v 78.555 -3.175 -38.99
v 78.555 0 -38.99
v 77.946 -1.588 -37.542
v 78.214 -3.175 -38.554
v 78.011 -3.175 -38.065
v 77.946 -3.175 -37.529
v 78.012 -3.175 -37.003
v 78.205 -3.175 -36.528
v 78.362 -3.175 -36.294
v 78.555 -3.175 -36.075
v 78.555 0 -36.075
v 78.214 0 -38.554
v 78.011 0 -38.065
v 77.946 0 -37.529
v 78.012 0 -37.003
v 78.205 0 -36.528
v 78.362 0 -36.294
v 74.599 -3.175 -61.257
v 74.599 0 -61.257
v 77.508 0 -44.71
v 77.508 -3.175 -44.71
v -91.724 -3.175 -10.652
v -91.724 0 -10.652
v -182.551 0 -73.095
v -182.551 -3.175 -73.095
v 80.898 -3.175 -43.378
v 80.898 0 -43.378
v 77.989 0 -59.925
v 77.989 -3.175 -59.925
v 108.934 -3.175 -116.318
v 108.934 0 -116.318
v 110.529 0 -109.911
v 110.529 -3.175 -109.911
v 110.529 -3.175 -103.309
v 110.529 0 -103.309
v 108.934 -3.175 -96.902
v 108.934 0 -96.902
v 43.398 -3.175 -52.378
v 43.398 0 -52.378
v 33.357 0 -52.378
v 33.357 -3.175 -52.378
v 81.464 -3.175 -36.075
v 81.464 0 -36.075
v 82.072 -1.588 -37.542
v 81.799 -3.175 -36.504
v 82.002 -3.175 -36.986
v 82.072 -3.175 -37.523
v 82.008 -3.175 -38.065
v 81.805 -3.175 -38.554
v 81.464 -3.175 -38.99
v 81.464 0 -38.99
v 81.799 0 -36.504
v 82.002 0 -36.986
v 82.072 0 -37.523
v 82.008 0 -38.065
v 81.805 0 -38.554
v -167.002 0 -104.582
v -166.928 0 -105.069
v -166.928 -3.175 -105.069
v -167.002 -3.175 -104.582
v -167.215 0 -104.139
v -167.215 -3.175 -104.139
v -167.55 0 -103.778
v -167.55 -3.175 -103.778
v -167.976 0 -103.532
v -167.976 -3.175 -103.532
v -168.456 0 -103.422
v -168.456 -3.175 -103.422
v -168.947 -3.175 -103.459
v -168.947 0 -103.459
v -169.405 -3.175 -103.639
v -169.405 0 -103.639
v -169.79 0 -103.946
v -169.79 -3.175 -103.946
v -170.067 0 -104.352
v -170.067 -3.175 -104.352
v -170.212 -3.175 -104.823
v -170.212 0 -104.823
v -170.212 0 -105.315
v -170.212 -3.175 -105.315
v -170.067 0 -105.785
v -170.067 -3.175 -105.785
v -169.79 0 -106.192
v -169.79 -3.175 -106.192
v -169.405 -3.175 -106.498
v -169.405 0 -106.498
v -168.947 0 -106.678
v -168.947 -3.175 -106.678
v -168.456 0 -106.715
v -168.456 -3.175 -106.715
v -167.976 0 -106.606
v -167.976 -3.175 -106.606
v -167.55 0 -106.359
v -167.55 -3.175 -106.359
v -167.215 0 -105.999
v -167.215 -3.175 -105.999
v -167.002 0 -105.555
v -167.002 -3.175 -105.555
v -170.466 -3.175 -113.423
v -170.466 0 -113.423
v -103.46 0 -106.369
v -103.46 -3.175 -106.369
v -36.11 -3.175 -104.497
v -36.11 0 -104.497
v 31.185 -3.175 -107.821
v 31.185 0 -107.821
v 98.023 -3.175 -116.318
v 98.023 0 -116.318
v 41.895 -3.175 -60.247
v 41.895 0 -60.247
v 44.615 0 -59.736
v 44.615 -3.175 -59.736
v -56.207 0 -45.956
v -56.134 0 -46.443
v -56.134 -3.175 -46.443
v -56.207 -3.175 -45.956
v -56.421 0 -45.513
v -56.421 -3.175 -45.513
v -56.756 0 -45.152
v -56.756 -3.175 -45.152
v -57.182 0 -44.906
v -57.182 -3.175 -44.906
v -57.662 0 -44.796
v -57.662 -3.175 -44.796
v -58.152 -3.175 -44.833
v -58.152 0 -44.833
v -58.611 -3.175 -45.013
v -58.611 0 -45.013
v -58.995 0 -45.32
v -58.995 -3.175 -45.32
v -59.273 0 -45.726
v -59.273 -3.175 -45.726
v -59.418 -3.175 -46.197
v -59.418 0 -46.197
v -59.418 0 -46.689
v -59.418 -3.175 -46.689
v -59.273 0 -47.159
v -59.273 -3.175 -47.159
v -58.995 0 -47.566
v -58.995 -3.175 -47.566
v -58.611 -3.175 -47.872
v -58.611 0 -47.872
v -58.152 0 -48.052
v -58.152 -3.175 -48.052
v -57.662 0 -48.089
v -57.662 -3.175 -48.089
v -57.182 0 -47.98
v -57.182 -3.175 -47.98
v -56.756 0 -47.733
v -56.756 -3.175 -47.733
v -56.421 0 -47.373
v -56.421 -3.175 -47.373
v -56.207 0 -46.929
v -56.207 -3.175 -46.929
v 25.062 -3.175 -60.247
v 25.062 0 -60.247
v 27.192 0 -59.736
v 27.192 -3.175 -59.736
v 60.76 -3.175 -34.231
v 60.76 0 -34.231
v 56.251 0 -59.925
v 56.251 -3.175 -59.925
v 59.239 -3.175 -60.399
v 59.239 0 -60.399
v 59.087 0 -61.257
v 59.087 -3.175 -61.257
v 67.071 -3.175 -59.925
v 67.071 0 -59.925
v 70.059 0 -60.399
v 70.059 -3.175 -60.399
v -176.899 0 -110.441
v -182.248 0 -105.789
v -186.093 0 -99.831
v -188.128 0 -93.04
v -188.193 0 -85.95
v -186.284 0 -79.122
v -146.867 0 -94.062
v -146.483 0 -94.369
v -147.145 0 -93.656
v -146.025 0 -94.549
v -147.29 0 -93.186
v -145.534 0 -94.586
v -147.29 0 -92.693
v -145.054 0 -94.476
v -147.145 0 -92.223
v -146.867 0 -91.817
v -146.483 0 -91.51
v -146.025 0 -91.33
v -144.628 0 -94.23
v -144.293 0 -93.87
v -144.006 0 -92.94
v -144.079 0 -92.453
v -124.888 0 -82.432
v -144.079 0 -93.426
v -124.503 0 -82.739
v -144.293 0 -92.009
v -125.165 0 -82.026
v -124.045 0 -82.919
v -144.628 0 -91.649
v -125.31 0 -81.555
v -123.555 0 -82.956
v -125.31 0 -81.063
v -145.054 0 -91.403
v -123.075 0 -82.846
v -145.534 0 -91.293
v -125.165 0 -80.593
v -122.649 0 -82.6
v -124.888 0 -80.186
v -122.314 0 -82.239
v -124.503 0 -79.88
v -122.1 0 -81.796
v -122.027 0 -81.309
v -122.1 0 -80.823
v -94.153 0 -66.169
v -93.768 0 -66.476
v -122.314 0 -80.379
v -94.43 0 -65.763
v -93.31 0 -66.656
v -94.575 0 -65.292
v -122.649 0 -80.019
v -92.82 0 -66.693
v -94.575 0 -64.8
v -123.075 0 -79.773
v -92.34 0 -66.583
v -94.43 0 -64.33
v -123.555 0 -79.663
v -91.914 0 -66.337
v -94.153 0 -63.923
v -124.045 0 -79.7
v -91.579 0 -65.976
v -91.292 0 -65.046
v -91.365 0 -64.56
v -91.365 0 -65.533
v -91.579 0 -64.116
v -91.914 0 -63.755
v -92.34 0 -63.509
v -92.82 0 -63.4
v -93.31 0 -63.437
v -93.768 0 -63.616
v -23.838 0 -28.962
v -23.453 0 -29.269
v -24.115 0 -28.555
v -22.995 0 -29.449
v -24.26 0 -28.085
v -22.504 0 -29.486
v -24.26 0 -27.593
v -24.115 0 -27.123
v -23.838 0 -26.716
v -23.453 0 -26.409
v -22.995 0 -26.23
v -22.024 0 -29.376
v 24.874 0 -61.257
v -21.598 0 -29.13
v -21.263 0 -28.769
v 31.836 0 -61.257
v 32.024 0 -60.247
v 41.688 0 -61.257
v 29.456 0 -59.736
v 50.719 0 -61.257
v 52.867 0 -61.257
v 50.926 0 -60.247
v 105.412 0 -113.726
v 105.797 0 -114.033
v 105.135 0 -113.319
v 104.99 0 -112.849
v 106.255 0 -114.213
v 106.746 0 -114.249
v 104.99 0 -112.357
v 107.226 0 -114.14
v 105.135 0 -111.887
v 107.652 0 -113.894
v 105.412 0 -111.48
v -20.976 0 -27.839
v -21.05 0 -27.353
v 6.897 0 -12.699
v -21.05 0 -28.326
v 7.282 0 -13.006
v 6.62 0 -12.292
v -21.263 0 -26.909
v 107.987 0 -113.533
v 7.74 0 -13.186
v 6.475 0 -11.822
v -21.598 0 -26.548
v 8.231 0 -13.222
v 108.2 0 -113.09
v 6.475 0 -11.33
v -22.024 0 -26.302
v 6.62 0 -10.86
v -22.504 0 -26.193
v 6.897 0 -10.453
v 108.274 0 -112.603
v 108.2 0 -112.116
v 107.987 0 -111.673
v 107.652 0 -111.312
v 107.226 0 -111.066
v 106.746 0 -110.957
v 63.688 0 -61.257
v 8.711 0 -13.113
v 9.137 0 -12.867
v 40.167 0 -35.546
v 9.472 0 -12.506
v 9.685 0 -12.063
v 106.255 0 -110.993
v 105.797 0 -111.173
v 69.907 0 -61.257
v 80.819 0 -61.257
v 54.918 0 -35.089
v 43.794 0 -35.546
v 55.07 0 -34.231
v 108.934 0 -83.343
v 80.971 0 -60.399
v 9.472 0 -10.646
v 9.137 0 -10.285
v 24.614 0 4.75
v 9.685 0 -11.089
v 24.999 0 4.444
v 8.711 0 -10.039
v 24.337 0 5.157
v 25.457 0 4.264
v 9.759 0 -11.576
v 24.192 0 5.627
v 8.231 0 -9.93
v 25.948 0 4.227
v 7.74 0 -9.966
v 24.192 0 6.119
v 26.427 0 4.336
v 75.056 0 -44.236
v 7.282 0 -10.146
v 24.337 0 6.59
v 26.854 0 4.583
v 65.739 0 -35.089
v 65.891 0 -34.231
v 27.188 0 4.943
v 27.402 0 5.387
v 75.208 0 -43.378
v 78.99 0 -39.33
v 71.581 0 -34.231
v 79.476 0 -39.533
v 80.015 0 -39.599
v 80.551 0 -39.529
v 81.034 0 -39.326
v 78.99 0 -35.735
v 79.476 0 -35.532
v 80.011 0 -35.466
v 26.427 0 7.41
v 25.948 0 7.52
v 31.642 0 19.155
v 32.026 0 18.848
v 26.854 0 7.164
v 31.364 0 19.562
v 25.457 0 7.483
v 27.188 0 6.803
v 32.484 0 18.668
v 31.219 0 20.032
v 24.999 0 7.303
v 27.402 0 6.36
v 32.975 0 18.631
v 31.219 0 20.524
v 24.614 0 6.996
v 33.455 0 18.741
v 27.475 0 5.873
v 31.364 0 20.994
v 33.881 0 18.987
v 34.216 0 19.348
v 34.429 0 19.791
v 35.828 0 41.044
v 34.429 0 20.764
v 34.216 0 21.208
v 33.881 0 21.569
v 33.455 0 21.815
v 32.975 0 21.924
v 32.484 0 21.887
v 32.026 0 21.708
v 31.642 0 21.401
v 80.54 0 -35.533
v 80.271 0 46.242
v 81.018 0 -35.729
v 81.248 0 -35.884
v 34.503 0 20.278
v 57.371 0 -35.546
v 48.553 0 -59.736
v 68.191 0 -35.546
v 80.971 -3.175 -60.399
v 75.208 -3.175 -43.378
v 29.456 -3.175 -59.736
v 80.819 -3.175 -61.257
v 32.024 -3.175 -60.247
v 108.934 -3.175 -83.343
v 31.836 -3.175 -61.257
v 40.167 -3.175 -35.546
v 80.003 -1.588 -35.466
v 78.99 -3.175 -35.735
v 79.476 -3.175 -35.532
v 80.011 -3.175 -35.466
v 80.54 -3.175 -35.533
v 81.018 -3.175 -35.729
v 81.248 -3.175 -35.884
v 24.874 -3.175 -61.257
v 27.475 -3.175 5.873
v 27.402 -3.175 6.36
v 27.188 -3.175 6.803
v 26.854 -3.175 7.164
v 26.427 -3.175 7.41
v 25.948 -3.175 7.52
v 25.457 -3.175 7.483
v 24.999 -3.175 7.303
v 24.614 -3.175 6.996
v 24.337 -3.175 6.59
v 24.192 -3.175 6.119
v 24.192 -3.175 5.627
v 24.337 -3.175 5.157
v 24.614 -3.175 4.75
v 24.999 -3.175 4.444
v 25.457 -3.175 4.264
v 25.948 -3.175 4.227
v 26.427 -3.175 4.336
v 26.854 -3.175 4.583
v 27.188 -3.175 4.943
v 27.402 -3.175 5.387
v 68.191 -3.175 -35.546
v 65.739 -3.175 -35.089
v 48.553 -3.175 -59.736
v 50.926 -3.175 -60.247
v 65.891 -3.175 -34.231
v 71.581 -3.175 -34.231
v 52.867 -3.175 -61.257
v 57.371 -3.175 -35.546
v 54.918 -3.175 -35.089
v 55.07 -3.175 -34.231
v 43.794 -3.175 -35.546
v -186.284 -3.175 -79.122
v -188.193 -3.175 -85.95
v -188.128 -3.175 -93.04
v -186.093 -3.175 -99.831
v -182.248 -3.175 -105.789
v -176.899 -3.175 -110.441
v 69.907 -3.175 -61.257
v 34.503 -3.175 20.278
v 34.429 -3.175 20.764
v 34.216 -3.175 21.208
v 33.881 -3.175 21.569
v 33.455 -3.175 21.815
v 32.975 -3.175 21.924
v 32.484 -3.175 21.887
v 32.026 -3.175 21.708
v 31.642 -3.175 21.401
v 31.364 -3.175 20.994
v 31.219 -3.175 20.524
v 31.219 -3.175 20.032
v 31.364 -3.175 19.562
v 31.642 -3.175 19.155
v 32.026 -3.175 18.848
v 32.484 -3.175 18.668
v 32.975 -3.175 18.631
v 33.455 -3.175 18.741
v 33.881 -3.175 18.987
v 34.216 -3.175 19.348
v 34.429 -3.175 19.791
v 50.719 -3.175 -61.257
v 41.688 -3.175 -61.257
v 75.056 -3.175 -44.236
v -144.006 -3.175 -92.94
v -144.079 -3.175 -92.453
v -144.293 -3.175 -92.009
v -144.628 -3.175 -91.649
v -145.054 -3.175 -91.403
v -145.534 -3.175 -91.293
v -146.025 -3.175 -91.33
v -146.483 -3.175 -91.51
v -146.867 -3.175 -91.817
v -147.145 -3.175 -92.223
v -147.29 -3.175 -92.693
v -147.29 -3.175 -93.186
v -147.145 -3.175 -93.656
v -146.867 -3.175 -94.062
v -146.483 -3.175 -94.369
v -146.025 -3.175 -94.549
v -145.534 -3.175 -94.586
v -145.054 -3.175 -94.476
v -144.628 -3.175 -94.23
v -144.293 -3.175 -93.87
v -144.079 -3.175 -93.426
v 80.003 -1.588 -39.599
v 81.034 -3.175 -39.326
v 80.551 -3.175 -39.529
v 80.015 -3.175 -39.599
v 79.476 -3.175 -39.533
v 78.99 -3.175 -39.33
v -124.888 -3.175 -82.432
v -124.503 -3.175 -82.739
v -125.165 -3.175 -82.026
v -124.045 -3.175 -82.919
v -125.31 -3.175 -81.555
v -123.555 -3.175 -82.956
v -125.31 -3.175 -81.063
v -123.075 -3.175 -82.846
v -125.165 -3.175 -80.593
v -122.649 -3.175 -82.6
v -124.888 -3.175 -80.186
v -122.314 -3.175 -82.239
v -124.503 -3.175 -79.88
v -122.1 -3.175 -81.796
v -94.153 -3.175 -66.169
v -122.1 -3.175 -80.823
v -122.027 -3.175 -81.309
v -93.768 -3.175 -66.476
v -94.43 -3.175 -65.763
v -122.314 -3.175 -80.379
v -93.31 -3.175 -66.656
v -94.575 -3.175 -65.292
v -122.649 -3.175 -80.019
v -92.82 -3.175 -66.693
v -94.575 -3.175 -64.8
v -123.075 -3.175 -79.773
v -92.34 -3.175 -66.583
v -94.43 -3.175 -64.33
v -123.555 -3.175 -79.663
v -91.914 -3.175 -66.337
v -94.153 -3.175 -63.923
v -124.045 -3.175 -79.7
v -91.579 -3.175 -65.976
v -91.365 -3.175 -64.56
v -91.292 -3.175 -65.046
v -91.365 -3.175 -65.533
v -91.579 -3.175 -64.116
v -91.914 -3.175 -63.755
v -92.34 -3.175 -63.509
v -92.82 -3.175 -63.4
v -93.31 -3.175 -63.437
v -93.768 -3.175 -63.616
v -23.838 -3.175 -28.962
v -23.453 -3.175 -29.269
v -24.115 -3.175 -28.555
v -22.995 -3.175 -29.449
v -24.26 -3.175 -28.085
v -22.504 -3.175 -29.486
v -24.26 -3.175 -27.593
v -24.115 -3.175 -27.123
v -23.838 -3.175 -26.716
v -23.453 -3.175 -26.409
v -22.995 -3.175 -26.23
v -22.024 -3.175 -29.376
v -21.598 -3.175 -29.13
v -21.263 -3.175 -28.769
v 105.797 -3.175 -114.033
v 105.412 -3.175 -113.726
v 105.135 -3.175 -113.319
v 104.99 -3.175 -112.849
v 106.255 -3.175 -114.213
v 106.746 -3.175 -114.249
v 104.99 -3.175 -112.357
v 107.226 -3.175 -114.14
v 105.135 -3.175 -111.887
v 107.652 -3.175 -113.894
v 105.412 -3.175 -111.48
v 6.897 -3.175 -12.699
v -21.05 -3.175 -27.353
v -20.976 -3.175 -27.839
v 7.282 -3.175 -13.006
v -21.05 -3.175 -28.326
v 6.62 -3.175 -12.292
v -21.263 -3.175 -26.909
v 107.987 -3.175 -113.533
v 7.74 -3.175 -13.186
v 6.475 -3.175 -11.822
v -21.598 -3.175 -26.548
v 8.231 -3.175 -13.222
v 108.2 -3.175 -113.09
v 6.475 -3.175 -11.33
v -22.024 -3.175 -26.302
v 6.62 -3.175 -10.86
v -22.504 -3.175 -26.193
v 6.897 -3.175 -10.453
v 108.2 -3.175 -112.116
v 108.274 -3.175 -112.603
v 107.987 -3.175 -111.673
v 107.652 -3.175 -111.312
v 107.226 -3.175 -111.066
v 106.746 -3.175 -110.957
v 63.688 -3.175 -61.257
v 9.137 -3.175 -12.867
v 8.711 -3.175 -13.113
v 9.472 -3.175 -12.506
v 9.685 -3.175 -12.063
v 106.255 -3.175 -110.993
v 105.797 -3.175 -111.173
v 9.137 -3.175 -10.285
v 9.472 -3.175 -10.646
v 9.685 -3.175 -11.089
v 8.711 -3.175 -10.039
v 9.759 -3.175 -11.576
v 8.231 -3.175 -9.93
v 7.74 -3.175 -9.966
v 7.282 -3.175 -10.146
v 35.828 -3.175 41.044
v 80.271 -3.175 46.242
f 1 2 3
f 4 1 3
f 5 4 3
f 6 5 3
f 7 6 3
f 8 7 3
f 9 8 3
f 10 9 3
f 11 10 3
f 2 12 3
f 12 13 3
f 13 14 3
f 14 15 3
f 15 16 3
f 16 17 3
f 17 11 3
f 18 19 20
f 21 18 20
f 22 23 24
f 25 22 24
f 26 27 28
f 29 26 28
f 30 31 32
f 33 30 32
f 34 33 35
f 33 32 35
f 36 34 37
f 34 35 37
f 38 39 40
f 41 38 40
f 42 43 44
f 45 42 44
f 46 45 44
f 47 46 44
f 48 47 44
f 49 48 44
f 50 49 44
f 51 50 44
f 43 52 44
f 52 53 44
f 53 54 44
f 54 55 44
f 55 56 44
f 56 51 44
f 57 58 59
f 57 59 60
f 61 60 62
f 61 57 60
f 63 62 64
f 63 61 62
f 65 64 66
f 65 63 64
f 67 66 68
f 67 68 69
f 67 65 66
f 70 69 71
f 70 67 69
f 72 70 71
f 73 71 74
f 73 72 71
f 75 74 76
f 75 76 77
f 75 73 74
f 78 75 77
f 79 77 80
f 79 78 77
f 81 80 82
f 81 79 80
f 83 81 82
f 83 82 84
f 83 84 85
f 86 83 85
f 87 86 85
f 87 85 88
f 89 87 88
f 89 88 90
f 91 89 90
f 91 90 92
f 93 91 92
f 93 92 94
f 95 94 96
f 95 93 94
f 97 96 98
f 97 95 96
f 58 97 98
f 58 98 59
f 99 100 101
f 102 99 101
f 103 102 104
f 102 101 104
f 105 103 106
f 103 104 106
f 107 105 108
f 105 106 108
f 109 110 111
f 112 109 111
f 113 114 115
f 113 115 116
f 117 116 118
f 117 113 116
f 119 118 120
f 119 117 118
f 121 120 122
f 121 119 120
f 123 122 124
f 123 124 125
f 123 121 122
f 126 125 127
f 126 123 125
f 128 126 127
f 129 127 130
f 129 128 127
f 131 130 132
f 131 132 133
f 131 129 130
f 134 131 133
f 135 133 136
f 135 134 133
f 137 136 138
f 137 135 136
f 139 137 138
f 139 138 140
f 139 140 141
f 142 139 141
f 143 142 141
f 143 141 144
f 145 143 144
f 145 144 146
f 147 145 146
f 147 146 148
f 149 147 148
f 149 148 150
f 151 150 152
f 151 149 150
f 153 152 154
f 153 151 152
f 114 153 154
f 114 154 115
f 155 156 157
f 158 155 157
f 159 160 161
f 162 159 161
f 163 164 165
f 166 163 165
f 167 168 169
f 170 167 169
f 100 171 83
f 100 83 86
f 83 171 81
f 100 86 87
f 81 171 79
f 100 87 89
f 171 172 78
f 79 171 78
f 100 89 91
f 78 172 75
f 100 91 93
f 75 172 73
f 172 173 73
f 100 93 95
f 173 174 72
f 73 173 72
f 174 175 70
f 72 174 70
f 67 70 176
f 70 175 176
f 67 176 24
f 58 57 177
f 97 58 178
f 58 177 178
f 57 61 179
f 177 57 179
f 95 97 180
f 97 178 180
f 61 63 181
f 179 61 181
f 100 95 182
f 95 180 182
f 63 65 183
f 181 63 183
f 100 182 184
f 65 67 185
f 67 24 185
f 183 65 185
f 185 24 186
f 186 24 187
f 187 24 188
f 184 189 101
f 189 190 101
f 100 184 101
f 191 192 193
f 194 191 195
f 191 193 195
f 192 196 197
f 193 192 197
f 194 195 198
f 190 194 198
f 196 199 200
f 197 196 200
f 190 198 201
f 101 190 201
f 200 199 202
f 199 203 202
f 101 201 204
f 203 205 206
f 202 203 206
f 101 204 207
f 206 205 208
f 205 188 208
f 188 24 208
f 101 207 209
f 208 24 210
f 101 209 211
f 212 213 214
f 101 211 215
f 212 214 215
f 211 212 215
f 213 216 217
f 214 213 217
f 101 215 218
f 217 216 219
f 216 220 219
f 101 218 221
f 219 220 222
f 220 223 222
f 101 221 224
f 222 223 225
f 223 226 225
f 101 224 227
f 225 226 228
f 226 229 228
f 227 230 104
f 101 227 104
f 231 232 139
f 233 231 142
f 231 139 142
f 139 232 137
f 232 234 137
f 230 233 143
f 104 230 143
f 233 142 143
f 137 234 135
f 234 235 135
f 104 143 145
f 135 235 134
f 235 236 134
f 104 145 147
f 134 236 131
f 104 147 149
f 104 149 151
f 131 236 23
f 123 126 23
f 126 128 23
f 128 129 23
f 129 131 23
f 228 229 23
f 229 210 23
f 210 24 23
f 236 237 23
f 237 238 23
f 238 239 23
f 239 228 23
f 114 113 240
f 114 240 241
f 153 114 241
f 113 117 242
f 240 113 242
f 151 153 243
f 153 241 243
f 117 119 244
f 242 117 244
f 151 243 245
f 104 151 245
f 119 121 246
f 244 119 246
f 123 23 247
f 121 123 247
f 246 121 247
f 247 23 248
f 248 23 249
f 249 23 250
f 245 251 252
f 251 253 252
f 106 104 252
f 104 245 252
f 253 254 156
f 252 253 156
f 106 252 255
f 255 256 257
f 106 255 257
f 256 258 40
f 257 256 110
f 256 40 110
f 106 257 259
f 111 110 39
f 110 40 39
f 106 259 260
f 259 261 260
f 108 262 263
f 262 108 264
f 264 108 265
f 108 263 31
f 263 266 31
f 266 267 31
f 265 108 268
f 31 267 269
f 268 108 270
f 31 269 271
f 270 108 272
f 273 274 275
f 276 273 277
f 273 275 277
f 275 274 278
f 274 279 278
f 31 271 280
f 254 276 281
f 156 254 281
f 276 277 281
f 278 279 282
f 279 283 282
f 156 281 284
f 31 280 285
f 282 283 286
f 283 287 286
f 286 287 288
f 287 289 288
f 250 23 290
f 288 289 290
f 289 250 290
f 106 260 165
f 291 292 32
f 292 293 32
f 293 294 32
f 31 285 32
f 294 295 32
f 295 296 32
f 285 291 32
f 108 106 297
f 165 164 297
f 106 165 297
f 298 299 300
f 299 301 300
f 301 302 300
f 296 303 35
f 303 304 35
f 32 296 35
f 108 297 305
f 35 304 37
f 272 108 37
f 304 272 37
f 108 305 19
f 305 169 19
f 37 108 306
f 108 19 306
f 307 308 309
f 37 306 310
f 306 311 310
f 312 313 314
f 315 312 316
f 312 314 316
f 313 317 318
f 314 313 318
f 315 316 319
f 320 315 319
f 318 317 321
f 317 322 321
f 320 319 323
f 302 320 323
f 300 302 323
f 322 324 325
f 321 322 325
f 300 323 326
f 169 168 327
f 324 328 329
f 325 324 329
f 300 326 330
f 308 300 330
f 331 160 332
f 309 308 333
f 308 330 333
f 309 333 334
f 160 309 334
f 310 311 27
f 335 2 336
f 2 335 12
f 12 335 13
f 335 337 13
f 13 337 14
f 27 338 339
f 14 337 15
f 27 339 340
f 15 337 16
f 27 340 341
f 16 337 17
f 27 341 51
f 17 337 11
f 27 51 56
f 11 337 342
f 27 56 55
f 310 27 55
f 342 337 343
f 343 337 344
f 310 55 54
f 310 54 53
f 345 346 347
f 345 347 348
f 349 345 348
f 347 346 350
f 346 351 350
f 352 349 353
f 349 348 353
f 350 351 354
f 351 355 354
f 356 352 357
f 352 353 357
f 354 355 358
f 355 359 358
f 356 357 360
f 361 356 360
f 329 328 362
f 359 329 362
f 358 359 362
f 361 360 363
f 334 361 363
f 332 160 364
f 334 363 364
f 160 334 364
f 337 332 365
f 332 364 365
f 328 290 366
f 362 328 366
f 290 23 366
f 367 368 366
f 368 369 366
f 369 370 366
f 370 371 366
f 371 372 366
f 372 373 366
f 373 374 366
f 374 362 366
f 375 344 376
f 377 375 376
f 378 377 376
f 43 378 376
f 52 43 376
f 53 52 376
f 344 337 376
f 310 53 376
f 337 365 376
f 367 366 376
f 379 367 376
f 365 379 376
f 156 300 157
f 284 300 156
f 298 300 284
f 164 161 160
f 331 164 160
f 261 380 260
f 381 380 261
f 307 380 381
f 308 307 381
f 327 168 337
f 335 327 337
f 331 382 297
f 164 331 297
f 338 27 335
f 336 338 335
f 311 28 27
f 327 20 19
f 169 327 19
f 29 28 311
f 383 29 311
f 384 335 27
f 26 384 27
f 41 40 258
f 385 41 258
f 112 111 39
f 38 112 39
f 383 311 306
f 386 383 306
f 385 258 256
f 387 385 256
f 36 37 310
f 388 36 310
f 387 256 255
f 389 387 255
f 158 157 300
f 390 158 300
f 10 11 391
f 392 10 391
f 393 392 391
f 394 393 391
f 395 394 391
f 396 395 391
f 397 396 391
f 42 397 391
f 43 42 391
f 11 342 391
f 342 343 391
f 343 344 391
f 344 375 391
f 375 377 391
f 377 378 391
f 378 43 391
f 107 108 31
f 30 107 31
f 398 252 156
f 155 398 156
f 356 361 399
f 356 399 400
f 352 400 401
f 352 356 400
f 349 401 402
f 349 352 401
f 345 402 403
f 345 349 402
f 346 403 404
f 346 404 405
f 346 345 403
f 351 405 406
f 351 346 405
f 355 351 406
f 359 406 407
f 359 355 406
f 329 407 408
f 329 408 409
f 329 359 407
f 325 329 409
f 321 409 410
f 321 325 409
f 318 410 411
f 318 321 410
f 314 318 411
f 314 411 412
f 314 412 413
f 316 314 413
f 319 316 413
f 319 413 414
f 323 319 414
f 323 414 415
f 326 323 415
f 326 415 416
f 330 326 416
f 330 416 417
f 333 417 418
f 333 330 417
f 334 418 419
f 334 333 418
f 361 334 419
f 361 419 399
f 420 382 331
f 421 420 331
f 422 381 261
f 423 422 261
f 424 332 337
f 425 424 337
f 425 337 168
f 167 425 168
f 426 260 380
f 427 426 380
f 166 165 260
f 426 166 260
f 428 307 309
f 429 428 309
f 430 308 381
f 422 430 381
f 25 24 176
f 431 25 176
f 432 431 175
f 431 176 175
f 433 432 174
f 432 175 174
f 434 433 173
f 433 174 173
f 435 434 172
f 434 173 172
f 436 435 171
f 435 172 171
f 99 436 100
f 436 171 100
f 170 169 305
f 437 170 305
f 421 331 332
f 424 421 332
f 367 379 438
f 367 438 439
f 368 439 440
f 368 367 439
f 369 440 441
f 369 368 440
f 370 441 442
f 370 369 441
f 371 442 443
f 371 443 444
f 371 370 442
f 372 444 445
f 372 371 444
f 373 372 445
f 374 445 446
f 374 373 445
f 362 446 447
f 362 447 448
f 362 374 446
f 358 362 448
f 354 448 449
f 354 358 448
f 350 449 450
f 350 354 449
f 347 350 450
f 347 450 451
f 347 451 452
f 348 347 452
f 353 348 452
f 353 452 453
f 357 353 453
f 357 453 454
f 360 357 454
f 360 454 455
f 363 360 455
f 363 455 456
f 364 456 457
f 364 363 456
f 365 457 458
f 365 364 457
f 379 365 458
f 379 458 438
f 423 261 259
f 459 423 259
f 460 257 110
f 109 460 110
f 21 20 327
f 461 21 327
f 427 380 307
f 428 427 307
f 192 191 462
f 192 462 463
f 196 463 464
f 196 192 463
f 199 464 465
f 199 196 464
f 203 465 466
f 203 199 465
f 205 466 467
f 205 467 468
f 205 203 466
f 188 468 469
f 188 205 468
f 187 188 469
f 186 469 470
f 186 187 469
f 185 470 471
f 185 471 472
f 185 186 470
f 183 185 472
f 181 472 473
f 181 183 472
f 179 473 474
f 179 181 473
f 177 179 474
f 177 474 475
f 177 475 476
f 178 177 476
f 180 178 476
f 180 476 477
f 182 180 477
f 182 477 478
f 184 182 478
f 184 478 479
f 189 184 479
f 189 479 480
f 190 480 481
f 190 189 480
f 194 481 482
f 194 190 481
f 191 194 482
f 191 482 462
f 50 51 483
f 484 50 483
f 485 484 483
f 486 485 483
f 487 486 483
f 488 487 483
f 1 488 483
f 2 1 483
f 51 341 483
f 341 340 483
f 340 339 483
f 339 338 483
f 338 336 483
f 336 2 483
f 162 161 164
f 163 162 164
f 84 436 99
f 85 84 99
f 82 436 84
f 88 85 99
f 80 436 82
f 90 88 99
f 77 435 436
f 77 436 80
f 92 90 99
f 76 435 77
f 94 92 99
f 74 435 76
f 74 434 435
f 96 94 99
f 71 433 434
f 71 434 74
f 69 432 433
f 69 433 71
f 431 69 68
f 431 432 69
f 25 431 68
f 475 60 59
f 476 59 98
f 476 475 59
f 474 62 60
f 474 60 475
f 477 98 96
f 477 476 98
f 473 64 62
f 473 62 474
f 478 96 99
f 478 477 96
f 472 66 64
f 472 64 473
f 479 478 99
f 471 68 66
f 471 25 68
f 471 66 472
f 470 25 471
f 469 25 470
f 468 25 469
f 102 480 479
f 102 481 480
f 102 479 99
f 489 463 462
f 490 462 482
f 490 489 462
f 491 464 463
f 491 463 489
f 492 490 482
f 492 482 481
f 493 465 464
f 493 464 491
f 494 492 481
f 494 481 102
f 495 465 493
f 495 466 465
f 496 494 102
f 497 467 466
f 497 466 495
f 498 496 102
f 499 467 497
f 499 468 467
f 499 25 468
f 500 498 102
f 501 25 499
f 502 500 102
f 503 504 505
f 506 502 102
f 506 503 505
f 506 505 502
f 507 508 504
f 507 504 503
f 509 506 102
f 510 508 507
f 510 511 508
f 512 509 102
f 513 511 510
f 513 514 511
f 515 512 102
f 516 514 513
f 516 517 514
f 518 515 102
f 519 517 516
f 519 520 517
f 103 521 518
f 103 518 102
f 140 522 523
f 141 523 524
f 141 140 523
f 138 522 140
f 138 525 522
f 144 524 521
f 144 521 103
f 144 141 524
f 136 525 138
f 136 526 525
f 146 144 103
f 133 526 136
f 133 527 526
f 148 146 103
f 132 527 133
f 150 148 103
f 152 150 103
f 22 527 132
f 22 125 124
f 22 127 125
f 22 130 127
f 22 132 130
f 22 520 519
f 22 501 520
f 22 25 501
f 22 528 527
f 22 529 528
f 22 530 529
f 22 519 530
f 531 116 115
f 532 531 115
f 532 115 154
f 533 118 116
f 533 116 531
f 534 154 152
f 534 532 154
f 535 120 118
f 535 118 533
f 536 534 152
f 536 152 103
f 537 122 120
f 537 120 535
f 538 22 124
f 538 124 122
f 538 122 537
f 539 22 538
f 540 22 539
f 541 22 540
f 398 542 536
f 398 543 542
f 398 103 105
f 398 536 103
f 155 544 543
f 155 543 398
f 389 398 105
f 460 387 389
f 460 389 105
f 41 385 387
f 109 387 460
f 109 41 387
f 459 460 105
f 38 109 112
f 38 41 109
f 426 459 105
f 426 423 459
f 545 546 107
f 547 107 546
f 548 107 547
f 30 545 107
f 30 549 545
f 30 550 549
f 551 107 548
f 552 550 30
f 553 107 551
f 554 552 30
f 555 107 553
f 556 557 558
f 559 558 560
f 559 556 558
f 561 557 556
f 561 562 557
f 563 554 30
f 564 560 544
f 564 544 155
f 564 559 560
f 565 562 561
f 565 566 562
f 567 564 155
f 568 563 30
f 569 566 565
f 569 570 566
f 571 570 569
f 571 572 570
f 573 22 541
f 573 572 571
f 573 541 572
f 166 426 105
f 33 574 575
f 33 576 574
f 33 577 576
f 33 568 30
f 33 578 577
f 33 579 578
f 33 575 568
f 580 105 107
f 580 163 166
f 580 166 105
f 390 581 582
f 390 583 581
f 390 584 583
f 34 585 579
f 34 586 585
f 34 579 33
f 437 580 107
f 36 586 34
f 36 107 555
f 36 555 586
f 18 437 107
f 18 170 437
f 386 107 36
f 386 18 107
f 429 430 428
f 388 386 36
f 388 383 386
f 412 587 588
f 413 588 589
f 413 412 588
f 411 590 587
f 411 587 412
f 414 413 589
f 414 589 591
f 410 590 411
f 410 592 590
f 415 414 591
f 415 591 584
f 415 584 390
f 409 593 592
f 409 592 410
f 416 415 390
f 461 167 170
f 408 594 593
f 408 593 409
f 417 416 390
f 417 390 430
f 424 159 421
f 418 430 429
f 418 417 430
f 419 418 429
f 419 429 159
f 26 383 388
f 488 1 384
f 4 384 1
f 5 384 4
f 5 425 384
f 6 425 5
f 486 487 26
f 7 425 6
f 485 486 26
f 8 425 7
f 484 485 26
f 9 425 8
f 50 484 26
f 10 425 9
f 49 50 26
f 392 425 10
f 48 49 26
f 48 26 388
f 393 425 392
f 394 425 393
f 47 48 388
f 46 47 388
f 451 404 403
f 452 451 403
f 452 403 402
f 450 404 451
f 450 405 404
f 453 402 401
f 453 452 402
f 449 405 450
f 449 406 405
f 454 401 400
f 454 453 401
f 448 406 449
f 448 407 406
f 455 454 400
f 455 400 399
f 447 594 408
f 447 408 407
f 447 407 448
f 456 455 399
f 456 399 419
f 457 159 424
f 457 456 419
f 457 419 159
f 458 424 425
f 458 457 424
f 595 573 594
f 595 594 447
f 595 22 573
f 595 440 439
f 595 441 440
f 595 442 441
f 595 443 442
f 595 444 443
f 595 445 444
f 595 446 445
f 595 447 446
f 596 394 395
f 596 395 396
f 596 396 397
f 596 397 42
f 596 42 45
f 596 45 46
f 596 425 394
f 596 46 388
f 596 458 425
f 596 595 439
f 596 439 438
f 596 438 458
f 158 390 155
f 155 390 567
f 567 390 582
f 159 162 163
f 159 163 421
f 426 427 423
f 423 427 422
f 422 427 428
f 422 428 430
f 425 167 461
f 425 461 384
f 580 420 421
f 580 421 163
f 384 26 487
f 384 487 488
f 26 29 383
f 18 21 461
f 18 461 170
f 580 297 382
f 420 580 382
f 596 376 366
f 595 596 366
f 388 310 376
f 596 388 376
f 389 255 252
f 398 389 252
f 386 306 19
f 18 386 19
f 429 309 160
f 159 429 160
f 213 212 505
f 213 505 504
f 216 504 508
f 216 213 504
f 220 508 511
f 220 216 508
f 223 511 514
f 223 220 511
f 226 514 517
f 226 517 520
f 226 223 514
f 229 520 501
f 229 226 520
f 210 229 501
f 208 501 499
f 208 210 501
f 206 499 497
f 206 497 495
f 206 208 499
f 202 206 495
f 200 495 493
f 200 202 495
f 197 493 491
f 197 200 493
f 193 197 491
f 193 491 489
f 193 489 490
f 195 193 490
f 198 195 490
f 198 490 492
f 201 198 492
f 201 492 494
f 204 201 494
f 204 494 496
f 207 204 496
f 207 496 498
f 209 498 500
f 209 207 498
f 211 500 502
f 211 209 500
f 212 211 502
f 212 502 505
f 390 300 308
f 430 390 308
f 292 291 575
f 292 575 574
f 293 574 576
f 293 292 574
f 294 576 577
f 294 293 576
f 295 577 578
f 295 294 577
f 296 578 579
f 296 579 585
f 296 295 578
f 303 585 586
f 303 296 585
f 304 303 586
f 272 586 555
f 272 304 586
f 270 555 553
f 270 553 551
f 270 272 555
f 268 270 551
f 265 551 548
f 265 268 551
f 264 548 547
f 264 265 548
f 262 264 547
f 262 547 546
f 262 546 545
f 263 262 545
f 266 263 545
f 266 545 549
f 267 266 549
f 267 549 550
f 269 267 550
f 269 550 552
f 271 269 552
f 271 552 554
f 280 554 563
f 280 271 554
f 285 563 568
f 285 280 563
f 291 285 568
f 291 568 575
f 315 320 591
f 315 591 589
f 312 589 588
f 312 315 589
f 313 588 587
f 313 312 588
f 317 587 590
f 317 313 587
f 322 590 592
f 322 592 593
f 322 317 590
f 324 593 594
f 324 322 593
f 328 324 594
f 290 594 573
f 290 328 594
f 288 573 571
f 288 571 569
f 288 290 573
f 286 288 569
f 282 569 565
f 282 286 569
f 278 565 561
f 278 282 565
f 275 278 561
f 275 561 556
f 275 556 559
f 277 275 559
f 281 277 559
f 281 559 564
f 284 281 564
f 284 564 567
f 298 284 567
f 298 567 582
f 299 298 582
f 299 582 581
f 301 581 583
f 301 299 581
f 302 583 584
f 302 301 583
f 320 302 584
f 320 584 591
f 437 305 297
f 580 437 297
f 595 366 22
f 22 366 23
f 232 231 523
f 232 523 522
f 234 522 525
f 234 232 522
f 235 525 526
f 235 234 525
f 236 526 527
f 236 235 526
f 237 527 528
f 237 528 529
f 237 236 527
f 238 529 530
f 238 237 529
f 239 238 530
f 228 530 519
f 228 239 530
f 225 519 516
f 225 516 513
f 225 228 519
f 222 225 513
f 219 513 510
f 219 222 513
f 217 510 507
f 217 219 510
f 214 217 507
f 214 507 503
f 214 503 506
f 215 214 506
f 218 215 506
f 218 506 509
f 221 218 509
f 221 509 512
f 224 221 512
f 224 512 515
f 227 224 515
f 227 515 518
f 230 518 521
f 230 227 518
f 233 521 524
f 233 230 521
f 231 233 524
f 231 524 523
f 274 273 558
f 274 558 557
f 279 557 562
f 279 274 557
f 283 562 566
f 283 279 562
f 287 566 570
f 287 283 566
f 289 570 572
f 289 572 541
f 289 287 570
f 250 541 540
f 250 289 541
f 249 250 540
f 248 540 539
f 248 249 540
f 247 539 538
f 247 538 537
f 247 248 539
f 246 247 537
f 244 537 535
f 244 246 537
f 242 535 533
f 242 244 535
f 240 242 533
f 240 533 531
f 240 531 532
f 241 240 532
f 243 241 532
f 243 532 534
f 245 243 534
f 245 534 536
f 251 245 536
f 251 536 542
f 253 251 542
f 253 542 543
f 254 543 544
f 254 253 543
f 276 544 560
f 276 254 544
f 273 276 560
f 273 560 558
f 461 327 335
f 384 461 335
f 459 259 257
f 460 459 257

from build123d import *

# Parameters (mm, degrees)
F0_R     = 1.651
F1_DEPTH = 3.175


with BuildPart() as f1:
    # F0 (on Front) → F1 (new body)
    with BuildSketch(Plane.XZ):
        with BuildLine():
            Line((-91.7235008659, -10.6519622226), (-182.5513082058, -73.0949387128))
            ThreePointArc((-182.5513082058, -73.0949387128), (-187.3498879631, -96.5075485814), (-170.466153763, -113.4225179282))
            ThreePointArc((-170.466153763, -113.4225179282), (-36.1095650791, -104.4974979583), (98.0233131029, -116.3178149951))
            Line((98.0233131029, -116.3178149951), (108.933846237, -116.3178149951))
            ThreePointArc((108.933846237, -116.3178149951), (110.7304402005, -106.6101038659), (108.933846237, -96.9023927367))
            Line((108.933846237, -96.9023927367), (108.933846237, -83.3431183613))
            Line((108.933846237, -83.3431183613), (80.270888986, 46.2421850049))
            Line((80.270888986, 46.2421850049), (35.8280335171, 41.0442404951))
            Line((35.8280335171, 41.0442404951), (-91.7235008659, -10.6519622226))
        make_face()
        with Locations((-168.5793250799, -105.0686376895)):
            Circle(F0_R, mode=Mode.SUBTRACT)
        with Locations((-145.6571504202, -92.9395344899)):
            Circle(F0_R, mode=Mode.SUBTRACT)
        with Locations((-123.6779055701, -81.3093757901)):
            Circle(F0_R, mode=Mode.SUBTRACT)
        with Locations((-92.9428839156, -65.04616102)):
            Circle(F0_R, mode=Mode.SUBTRACT)
        with Locations((-57.7850724394, -46.4426589528)):
            Circle(F0_R, mode=Mode.SUBTRACT)
        with Locations((106.6226363182, -112.6031056046)):
            Circle(F0_R, mode=Mode.SUBTRACT)
        Polygon((29.4560794945, -59.7358805891), (32.0242086794, -60.2470721804), (31.8355546398, -61.2572841346), (24.8736120152, -61.2572841346), (25.0622660549, -60.2470721804), (27.1922310187, -59.7358805891), (40.1667604553, -35.5455642146), (43.7937865079, -35.5455642146), (48.5527367984, -59.7358805891), (50.9261263295, -60.2470721804), (50.7192154473, -61.2572841346), (41.6881640008, -61.2572841346), (41.895074883, -60.2470721804), (44.6153444225, -59.7358805891), (43.3982215861, -52.3783730427), (33.3569581853, -52.3783730427), align=None, mode=Mode.SUBTRACT)
        Polygon((60.760478848, -34.2310715512), (56.251038739, -59.9245346287), (59.2390753025, -60.3992125349), (59.0869349479, -61.2572841346), (52.8674372537, -61.2572841346), (57.3707917485, -35.5455642146), (54.9182892331, -35.0891431509), (55.0704295876, -34.2310715512), align=None, mode=Mode.SUBTRACT)
        Polygon((71.5807008641, -34.2310715512), (67.0712607551, -59.9245346287), (70.0592973185, -60.3992125349), (69.907156964, -61.2572841346), (63.6876592697, -61.2572841346), (68.1910137646, -35.5455642146), (65.7385112491, -35.0891431509), (65.8906516037, -34.2310715512), align=None, mode=Mode.SUBTRACT)
        Polygon((80.8977761772, -43.3777496671), (77.988852598, -59.9245346287), (80.9708035473, -60.3992125349), (80.8186631928, -61.2572841346), (74.5991654985, -61.2572841346), (77.5080890776, -44.7104991731), (75.0555865622, -44.2358212668), (75.2077269167, -43.3777496671), align=None, mode=Mode.SUBTRACT)
        with BuildLine():
            add(Edge.make_bspline(
                [(81.4637382961, -36.0750126484), (82.0722997143, -36.6835740667), (82.0722997143, -37.5416456664)],
                knots=[0, 0, 0, 1, 1, 1], degree=2))
            add(Edge.make_bspline(
                [(82.0722997143, -37.5416456664), (82.0722997143, -38.3814604235), (81.4637382961, -38.9900218417)],
                knots=[0, 0, 0, 1, 1, 1], degree=2))
            add(Edge.make_bspline(
                [(81.4637382961, -38.9900218417), (80.8551768779, -39.59858326), (80.0031908924, -39.59858326)],
                knots=[0, 0, 0, 1, 1, 1], degree=2))
            add(Edge.make_bspline(
                [(80.0031908924, -39.59858326), (79.1633761352, -39.59858326), (78.554814717, -38.9900218417)],
                knots=[0, 0, 0, 1, 1, 1], degree=2))
            add(Edge.make_bspline(
                [(78.554814717, -38.9900218417), (77.9462532988, -38.3814604235), (77.9462532988, -37.5416456664)],
                knots=[0, 0, 0, 1, 1, 1], degree=2))
            add(Edge.make_bspline(
                [(77.9462532988, -37.5416456664), (77.9462532988, -36.6835740667), (78.554814717, -36.0750126484)],
                knots=[0, 0, 0, 1, 1, 1], degree=2))
            add(Edge.make_bspline(
                [(78.554814717, -36.0750126484), (79.1633761352, -35.4664512302), (80.0031908924, -35.4664512302)],
                knots=[0, 0, 0, 1, 1, 1], degree=2))
            add(Edge.make_bspline(
                [(80.0031908924, -35.4664512302), (80.8551768779, -35.4664512302), (81.4637382961, -36.0750126484)],
                knots=[0, 0, 0, 1, 1, 1], degree=2))
        make_face(mode=Mode.SUBTRACT)
        with Locations((-22.6272609633, -27.8391568856)):
            Circle(F0_R, mode=Mode.SUBTRACT)
        with Locations((8.1077606912, -11.5759421154)):
            Circle(F0_R, mode=Mode.SUBTRACT)
        with Locations((25.8241575211, 5.8733294718)):
            Circle(F0_R, mode=Mode.SUBTRACT)
        with Locations((32.8517727122, 20.2778487448)):
            Circle(F0_R, mode=Mode.SUBTRACT)
    extrude(amount=F1_DEPTH)


solid = f1.part
